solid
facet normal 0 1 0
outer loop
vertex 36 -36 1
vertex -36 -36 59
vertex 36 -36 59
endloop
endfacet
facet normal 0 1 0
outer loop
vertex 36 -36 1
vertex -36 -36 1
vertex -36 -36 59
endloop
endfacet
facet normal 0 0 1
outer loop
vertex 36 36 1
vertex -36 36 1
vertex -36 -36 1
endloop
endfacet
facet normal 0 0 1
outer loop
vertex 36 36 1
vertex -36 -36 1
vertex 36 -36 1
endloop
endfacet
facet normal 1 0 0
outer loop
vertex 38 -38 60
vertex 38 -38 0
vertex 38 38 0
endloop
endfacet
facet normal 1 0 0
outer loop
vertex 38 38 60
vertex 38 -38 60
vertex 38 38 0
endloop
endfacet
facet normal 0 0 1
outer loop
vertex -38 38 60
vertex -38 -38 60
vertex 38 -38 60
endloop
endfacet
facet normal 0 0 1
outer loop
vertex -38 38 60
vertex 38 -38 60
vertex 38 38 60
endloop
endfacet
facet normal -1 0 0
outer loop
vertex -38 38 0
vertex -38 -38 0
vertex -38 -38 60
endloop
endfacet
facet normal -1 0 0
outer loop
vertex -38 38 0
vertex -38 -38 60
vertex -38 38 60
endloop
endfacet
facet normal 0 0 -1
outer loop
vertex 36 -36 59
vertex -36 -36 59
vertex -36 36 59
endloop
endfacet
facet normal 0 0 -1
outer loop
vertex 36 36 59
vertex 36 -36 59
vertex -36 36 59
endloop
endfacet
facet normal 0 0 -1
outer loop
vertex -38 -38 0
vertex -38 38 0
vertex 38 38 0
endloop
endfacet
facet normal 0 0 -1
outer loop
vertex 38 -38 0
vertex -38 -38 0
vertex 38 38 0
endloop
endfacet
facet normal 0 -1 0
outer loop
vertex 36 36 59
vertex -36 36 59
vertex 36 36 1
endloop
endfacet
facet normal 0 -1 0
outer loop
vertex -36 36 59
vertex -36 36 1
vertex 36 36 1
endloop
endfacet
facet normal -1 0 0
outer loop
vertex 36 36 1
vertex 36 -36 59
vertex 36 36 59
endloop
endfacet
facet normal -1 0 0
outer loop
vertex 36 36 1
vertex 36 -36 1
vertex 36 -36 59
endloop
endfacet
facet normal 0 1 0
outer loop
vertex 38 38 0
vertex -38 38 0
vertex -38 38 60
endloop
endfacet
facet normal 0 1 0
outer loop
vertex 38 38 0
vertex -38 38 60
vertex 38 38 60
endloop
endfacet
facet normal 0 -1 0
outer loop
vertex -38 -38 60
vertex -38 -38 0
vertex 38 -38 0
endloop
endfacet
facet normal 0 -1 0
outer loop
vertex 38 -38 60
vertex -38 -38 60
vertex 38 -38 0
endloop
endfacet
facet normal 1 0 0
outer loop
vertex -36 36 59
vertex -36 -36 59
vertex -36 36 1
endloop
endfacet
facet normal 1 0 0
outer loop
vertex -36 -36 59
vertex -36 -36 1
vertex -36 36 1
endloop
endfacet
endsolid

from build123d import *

# Parameters (mm, degrees)
F0_W     = 74
F0_H     = 74
F1_DEPTH = 59
F2_T     = -1
F3_W     = 76
F3_H     = 76
F3_W_2   = 74
F3_H_2   = 74
F4_DEPTH = 60
F5_W     = 74
F5_H     = 1
F6_DEPTH = 74


with BuildPart() as f1:
    # F0 (on Top) → F1 (new body)
    with BuildSketch(Plane.XY):
        Rectangle(F0_W, F0_H)
    extrude(amount=F1_DEPTH)

    # F2
    f2_openings = [f1.faces().sort_by_distance(p)[0] for p in [
        (0, 0, 59),
    ]]
    offset(amount=F2_T, openings=f2_openings)

    # F3 (on Top) → F4 (join)
    with BuildSketch(Plane.XY):
        Rectangle(F3_W, F3_H)
        Rectangle(F3_W_2, F3_H_2, mode=Mode.SUBTRACT)
    extrude(amount=F4_DEPTH)

    # F5 (on face) → F6 (join, through all)
    with BuildSketch(Plane.YZ.offset(-37)):
        with Locations((0, 59.5)):
            Rectangle(F5_W, F5_H)
    extrude(amount=F6_DEPTH)


solid = f1.part
